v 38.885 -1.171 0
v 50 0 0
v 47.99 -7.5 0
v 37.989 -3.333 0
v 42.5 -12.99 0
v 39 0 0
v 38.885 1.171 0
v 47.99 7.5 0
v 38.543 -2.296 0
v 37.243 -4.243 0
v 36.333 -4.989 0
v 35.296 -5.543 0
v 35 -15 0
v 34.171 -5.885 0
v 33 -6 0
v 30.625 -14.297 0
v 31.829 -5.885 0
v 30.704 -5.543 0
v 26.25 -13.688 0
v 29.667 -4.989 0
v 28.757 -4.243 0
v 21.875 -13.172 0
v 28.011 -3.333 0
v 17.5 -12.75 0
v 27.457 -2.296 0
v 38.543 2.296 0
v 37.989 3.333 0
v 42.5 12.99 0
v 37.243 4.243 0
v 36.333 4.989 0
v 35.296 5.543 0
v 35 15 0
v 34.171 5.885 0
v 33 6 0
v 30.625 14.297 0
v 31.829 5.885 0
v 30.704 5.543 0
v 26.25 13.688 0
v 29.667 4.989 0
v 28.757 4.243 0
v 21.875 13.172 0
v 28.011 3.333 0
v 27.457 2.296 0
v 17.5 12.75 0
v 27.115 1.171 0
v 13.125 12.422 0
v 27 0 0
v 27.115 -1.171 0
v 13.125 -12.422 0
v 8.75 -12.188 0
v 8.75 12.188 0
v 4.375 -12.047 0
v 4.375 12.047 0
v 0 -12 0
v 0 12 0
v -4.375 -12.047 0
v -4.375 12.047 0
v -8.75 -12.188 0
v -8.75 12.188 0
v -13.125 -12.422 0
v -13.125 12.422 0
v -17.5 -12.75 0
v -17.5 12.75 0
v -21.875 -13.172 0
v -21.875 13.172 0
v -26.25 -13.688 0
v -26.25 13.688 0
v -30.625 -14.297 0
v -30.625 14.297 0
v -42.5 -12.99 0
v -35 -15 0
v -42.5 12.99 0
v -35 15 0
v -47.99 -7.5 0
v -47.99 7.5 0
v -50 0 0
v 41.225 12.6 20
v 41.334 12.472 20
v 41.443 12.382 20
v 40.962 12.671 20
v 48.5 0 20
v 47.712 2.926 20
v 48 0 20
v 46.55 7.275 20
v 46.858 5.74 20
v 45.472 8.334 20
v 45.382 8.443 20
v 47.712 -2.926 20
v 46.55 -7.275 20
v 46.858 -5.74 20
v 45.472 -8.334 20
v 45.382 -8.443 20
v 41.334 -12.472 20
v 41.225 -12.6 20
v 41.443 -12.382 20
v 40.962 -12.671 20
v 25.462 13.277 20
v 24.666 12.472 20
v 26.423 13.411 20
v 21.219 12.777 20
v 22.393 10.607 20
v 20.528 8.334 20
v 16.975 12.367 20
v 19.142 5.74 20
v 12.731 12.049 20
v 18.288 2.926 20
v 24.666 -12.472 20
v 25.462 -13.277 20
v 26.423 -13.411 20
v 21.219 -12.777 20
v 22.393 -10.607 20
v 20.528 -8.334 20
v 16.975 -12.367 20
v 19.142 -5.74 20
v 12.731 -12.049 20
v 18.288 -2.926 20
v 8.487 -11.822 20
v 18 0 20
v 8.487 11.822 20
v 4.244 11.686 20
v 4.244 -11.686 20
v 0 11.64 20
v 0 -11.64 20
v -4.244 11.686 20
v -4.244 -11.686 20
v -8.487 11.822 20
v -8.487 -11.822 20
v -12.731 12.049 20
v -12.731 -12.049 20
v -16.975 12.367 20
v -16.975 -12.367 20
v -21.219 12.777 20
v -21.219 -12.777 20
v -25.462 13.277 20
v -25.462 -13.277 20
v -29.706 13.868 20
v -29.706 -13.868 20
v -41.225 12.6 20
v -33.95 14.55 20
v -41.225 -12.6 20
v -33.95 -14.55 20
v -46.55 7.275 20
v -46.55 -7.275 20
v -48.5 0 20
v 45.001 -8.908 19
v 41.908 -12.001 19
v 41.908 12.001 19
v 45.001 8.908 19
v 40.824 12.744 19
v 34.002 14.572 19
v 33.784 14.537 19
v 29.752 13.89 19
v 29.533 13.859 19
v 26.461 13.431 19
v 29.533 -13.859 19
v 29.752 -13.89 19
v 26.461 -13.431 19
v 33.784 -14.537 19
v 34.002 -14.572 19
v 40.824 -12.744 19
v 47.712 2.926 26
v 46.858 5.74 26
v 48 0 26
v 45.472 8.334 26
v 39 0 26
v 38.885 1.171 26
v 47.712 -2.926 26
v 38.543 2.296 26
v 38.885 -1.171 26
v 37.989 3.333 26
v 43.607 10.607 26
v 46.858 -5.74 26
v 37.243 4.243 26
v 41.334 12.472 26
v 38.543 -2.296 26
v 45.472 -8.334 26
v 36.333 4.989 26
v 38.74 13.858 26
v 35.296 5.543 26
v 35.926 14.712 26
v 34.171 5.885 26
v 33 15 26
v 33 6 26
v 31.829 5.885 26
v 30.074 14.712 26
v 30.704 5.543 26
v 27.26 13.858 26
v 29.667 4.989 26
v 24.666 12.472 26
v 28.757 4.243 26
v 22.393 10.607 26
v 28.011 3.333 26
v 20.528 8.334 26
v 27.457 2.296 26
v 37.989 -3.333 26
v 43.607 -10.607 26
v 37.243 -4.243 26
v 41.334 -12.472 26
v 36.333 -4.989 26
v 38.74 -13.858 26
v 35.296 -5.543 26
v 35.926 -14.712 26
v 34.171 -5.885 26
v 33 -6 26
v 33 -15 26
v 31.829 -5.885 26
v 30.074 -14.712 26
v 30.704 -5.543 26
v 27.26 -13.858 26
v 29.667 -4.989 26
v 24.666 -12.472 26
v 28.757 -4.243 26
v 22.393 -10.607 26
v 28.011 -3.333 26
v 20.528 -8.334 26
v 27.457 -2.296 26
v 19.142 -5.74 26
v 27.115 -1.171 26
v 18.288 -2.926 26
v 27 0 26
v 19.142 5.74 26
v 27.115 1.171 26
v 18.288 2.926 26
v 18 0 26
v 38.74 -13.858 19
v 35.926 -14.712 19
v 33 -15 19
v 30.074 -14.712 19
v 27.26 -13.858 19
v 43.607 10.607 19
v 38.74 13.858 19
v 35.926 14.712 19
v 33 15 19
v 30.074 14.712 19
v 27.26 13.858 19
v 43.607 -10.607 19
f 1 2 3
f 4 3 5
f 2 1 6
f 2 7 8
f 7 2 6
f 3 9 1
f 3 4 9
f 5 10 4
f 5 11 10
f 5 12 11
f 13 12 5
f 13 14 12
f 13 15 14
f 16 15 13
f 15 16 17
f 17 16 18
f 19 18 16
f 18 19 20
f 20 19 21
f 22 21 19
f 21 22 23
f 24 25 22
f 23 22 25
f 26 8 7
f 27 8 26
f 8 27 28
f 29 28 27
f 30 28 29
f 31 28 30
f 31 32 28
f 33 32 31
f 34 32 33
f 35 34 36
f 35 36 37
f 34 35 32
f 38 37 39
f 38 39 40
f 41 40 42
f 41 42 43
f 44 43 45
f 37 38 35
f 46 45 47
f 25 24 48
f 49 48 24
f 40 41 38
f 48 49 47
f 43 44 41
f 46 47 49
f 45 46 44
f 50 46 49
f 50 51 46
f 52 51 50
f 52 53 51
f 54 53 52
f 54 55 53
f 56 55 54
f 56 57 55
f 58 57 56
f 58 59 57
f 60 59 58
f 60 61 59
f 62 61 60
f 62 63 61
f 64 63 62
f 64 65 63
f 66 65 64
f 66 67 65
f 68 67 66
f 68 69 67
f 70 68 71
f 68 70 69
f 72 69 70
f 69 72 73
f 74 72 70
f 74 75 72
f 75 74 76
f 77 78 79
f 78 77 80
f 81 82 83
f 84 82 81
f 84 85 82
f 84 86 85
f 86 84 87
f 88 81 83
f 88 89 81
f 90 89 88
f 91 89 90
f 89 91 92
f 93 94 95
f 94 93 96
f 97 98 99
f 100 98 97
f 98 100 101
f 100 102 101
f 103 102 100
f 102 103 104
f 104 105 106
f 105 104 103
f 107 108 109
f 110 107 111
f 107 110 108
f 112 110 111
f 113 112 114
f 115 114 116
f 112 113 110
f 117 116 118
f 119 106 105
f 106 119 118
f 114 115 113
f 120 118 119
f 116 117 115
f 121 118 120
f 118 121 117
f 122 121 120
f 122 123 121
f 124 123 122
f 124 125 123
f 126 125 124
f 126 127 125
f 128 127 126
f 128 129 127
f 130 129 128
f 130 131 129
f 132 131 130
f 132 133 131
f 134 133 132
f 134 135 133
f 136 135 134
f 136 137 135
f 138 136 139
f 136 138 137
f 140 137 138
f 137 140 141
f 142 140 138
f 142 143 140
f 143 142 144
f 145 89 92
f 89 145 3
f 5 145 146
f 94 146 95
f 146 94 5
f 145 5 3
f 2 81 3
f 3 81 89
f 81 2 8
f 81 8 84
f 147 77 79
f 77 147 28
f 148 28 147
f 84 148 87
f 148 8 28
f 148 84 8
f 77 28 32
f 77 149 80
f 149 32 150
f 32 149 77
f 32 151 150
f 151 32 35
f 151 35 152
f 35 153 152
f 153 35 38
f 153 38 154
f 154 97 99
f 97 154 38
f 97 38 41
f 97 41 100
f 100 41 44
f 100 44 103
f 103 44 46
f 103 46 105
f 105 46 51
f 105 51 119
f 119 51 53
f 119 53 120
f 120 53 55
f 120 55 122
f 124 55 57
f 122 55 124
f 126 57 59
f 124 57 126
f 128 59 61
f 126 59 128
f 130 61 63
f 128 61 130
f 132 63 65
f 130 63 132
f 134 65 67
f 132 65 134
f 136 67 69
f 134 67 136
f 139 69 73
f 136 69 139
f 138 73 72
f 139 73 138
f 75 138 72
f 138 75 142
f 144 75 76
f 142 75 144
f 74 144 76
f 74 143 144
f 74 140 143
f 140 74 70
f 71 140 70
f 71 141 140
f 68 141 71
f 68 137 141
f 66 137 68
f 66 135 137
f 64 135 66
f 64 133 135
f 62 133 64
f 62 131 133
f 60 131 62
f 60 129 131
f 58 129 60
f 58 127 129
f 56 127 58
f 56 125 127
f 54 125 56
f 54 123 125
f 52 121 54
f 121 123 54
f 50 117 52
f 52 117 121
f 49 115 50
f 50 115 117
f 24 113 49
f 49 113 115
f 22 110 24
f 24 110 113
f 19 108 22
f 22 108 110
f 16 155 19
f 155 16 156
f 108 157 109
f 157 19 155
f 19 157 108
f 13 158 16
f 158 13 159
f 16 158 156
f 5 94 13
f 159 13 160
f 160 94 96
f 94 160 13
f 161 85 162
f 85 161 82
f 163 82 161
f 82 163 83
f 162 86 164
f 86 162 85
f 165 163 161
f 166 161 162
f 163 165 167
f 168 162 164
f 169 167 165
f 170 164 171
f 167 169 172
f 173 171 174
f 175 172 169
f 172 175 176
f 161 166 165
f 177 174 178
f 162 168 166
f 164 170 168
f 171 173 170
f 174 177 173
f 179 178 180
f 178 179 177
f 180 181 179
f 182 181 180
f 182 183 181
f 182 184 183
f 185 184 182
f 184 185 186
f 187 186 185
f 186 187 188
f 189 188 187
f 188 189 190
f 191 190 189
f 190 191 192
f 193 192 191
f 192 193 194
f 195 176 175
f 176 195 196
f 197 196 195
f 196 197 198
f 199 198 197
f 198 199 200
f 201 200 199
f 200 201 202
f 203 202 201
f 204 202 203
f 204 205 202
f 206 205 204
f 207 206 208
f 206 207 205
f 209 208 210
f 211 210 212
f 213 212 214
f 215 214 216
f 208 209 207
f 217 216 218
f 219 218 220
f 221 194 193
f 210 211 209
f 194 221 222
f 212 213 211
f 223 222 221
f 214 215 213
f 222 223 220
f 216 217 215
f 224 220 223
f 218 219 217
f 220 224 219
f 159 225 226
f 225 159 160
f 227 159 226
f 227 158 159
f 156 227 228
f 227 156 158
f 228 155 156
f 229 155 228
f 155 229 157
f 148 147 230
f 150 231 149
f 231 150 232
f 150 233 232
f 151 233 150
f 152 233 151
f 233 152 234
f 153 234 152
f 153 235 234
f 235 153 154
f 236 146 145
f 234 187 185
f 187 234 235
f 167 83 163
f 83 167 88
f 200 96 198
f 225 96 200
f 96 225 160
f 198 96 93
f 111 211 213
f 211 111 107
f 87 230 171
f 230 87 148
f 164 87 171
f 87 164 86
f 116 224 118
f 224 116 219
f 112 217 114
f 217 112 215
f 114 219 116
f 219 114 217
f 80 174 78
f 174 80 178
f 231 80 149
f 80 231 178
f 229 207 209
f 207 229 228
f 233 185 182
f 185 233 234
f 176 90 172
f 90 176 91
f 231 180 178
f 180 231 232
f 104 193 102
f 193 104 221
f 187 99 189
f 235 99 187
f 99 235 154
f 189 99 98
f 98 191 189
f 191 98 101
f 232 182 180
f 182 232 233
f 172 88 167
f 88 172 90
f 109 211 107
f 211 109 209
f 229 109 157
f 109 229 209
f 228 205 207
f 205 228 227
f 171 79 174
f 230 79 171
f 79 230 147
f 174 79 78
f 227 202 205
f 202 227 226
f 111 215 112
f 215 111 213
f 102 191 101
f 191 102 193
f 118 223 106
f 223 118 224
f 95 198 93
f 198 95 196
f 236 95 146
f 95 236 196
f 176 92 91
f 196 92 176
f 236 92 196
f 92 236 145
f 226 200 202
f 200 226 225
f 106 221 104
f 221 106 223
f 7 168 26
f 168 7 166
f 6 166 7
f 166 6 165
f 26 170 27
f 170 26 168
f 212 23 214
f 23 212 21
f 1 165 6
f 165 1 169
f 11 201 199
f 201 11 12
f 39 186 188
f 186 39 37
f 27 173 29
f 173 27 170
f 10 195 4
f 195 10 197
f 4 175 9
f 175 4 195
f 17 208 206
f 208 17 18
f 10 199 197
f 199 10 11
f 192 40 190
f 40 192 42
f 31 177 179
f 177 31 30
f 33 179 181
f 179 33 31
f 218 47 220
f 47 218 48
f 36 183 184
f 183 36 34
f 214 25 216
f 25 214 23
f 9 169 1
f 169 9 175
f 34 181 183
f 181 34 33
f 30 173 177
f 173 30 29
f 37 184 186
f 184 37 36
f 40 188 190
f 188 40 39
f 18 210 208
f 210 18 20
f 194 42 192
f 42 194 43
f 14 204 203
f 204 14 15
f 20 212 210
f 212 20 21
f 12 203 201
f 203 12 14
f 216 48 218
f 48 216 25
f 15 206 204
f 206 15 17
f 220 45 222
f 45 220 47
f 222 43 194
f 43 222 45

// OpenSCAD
$fn = 32;

// ----------------------------------------------------------------------
// Handle: 100 x 30 mm grip, 20 mm thick
// ----------------------------------------------------------------------

// --- parameters (mm) ---
length = 100;             // grip length
width = 30;               // grip width
thickness = 20;           // grip thickness
waist = 0.8;              // width factor at the middle
draft = 0.97;             // top face scale of the extrusion
boss_d = 30;              // mounting boss diameter
boss_h = 6;               // mounting boss height
boss_hole_d = 12;         // screw clearance through the boss
boss_r = 33;              // boss centre from the grip centre

/* ergonomic grip outline, closed spline-like polygon in the XY plane */
grip = [[-35, 15], [-30.625, 14.297], [-26.25, 13.688], [-21.875, 13.172], [-17.5, 12.75], [-13.125, 12.422], [-8.75, 12.188], [-4.375, 12.047], [0, 12], [4.375, 12.047], [8.75, 12.188], [13.125, 12.422], [17.5, 12.75], [21.875, 13.172], [26.25, 13.688], [30.625, 14.297], [35, 15], [42.5, 12.99], [47.99, 7.5], [50, 0], [47.99, -7.5], [42.5, -12.99], [35, -15], [35, -15], [30.625, -14.297], [26.25, -13.688], [21.875, -13.172], [17.5, -12.75], [13.125, -12.422], [8.75, -12.188], [4.375, -12.047], [0, -12], [-4.375, -12.047], [-8.75, -12.188], [-13.125, -12.422], [-17.5, -12.75], [-21.875, -13.172], [-26.25, -13.688], [-30.625, -14.297], [-35, -15], [-42.5, -12.99], [-47.99, -7.5], [-50, 0], [-47.99, 7.5], [-42.5, 12.99], [-35, 15]];

module grip_body() {
  linear_extrude(height = thickness, scale = draft) polygon(grip);
}

module boss_body() {
  /* sunk 1 mm into the grip so the joint overlaps */
  translate([boss_r, 0, thickness - 1]) cylinder(h = boss_h + 1, d = boss_d);
}

difference() {
  union() {
    grip_body();
    boss_body();
  }
  translate([boss_r, 0, -1]) cylinder(h = thickness + boss_h + 2, d = boss_hole_d);
}
